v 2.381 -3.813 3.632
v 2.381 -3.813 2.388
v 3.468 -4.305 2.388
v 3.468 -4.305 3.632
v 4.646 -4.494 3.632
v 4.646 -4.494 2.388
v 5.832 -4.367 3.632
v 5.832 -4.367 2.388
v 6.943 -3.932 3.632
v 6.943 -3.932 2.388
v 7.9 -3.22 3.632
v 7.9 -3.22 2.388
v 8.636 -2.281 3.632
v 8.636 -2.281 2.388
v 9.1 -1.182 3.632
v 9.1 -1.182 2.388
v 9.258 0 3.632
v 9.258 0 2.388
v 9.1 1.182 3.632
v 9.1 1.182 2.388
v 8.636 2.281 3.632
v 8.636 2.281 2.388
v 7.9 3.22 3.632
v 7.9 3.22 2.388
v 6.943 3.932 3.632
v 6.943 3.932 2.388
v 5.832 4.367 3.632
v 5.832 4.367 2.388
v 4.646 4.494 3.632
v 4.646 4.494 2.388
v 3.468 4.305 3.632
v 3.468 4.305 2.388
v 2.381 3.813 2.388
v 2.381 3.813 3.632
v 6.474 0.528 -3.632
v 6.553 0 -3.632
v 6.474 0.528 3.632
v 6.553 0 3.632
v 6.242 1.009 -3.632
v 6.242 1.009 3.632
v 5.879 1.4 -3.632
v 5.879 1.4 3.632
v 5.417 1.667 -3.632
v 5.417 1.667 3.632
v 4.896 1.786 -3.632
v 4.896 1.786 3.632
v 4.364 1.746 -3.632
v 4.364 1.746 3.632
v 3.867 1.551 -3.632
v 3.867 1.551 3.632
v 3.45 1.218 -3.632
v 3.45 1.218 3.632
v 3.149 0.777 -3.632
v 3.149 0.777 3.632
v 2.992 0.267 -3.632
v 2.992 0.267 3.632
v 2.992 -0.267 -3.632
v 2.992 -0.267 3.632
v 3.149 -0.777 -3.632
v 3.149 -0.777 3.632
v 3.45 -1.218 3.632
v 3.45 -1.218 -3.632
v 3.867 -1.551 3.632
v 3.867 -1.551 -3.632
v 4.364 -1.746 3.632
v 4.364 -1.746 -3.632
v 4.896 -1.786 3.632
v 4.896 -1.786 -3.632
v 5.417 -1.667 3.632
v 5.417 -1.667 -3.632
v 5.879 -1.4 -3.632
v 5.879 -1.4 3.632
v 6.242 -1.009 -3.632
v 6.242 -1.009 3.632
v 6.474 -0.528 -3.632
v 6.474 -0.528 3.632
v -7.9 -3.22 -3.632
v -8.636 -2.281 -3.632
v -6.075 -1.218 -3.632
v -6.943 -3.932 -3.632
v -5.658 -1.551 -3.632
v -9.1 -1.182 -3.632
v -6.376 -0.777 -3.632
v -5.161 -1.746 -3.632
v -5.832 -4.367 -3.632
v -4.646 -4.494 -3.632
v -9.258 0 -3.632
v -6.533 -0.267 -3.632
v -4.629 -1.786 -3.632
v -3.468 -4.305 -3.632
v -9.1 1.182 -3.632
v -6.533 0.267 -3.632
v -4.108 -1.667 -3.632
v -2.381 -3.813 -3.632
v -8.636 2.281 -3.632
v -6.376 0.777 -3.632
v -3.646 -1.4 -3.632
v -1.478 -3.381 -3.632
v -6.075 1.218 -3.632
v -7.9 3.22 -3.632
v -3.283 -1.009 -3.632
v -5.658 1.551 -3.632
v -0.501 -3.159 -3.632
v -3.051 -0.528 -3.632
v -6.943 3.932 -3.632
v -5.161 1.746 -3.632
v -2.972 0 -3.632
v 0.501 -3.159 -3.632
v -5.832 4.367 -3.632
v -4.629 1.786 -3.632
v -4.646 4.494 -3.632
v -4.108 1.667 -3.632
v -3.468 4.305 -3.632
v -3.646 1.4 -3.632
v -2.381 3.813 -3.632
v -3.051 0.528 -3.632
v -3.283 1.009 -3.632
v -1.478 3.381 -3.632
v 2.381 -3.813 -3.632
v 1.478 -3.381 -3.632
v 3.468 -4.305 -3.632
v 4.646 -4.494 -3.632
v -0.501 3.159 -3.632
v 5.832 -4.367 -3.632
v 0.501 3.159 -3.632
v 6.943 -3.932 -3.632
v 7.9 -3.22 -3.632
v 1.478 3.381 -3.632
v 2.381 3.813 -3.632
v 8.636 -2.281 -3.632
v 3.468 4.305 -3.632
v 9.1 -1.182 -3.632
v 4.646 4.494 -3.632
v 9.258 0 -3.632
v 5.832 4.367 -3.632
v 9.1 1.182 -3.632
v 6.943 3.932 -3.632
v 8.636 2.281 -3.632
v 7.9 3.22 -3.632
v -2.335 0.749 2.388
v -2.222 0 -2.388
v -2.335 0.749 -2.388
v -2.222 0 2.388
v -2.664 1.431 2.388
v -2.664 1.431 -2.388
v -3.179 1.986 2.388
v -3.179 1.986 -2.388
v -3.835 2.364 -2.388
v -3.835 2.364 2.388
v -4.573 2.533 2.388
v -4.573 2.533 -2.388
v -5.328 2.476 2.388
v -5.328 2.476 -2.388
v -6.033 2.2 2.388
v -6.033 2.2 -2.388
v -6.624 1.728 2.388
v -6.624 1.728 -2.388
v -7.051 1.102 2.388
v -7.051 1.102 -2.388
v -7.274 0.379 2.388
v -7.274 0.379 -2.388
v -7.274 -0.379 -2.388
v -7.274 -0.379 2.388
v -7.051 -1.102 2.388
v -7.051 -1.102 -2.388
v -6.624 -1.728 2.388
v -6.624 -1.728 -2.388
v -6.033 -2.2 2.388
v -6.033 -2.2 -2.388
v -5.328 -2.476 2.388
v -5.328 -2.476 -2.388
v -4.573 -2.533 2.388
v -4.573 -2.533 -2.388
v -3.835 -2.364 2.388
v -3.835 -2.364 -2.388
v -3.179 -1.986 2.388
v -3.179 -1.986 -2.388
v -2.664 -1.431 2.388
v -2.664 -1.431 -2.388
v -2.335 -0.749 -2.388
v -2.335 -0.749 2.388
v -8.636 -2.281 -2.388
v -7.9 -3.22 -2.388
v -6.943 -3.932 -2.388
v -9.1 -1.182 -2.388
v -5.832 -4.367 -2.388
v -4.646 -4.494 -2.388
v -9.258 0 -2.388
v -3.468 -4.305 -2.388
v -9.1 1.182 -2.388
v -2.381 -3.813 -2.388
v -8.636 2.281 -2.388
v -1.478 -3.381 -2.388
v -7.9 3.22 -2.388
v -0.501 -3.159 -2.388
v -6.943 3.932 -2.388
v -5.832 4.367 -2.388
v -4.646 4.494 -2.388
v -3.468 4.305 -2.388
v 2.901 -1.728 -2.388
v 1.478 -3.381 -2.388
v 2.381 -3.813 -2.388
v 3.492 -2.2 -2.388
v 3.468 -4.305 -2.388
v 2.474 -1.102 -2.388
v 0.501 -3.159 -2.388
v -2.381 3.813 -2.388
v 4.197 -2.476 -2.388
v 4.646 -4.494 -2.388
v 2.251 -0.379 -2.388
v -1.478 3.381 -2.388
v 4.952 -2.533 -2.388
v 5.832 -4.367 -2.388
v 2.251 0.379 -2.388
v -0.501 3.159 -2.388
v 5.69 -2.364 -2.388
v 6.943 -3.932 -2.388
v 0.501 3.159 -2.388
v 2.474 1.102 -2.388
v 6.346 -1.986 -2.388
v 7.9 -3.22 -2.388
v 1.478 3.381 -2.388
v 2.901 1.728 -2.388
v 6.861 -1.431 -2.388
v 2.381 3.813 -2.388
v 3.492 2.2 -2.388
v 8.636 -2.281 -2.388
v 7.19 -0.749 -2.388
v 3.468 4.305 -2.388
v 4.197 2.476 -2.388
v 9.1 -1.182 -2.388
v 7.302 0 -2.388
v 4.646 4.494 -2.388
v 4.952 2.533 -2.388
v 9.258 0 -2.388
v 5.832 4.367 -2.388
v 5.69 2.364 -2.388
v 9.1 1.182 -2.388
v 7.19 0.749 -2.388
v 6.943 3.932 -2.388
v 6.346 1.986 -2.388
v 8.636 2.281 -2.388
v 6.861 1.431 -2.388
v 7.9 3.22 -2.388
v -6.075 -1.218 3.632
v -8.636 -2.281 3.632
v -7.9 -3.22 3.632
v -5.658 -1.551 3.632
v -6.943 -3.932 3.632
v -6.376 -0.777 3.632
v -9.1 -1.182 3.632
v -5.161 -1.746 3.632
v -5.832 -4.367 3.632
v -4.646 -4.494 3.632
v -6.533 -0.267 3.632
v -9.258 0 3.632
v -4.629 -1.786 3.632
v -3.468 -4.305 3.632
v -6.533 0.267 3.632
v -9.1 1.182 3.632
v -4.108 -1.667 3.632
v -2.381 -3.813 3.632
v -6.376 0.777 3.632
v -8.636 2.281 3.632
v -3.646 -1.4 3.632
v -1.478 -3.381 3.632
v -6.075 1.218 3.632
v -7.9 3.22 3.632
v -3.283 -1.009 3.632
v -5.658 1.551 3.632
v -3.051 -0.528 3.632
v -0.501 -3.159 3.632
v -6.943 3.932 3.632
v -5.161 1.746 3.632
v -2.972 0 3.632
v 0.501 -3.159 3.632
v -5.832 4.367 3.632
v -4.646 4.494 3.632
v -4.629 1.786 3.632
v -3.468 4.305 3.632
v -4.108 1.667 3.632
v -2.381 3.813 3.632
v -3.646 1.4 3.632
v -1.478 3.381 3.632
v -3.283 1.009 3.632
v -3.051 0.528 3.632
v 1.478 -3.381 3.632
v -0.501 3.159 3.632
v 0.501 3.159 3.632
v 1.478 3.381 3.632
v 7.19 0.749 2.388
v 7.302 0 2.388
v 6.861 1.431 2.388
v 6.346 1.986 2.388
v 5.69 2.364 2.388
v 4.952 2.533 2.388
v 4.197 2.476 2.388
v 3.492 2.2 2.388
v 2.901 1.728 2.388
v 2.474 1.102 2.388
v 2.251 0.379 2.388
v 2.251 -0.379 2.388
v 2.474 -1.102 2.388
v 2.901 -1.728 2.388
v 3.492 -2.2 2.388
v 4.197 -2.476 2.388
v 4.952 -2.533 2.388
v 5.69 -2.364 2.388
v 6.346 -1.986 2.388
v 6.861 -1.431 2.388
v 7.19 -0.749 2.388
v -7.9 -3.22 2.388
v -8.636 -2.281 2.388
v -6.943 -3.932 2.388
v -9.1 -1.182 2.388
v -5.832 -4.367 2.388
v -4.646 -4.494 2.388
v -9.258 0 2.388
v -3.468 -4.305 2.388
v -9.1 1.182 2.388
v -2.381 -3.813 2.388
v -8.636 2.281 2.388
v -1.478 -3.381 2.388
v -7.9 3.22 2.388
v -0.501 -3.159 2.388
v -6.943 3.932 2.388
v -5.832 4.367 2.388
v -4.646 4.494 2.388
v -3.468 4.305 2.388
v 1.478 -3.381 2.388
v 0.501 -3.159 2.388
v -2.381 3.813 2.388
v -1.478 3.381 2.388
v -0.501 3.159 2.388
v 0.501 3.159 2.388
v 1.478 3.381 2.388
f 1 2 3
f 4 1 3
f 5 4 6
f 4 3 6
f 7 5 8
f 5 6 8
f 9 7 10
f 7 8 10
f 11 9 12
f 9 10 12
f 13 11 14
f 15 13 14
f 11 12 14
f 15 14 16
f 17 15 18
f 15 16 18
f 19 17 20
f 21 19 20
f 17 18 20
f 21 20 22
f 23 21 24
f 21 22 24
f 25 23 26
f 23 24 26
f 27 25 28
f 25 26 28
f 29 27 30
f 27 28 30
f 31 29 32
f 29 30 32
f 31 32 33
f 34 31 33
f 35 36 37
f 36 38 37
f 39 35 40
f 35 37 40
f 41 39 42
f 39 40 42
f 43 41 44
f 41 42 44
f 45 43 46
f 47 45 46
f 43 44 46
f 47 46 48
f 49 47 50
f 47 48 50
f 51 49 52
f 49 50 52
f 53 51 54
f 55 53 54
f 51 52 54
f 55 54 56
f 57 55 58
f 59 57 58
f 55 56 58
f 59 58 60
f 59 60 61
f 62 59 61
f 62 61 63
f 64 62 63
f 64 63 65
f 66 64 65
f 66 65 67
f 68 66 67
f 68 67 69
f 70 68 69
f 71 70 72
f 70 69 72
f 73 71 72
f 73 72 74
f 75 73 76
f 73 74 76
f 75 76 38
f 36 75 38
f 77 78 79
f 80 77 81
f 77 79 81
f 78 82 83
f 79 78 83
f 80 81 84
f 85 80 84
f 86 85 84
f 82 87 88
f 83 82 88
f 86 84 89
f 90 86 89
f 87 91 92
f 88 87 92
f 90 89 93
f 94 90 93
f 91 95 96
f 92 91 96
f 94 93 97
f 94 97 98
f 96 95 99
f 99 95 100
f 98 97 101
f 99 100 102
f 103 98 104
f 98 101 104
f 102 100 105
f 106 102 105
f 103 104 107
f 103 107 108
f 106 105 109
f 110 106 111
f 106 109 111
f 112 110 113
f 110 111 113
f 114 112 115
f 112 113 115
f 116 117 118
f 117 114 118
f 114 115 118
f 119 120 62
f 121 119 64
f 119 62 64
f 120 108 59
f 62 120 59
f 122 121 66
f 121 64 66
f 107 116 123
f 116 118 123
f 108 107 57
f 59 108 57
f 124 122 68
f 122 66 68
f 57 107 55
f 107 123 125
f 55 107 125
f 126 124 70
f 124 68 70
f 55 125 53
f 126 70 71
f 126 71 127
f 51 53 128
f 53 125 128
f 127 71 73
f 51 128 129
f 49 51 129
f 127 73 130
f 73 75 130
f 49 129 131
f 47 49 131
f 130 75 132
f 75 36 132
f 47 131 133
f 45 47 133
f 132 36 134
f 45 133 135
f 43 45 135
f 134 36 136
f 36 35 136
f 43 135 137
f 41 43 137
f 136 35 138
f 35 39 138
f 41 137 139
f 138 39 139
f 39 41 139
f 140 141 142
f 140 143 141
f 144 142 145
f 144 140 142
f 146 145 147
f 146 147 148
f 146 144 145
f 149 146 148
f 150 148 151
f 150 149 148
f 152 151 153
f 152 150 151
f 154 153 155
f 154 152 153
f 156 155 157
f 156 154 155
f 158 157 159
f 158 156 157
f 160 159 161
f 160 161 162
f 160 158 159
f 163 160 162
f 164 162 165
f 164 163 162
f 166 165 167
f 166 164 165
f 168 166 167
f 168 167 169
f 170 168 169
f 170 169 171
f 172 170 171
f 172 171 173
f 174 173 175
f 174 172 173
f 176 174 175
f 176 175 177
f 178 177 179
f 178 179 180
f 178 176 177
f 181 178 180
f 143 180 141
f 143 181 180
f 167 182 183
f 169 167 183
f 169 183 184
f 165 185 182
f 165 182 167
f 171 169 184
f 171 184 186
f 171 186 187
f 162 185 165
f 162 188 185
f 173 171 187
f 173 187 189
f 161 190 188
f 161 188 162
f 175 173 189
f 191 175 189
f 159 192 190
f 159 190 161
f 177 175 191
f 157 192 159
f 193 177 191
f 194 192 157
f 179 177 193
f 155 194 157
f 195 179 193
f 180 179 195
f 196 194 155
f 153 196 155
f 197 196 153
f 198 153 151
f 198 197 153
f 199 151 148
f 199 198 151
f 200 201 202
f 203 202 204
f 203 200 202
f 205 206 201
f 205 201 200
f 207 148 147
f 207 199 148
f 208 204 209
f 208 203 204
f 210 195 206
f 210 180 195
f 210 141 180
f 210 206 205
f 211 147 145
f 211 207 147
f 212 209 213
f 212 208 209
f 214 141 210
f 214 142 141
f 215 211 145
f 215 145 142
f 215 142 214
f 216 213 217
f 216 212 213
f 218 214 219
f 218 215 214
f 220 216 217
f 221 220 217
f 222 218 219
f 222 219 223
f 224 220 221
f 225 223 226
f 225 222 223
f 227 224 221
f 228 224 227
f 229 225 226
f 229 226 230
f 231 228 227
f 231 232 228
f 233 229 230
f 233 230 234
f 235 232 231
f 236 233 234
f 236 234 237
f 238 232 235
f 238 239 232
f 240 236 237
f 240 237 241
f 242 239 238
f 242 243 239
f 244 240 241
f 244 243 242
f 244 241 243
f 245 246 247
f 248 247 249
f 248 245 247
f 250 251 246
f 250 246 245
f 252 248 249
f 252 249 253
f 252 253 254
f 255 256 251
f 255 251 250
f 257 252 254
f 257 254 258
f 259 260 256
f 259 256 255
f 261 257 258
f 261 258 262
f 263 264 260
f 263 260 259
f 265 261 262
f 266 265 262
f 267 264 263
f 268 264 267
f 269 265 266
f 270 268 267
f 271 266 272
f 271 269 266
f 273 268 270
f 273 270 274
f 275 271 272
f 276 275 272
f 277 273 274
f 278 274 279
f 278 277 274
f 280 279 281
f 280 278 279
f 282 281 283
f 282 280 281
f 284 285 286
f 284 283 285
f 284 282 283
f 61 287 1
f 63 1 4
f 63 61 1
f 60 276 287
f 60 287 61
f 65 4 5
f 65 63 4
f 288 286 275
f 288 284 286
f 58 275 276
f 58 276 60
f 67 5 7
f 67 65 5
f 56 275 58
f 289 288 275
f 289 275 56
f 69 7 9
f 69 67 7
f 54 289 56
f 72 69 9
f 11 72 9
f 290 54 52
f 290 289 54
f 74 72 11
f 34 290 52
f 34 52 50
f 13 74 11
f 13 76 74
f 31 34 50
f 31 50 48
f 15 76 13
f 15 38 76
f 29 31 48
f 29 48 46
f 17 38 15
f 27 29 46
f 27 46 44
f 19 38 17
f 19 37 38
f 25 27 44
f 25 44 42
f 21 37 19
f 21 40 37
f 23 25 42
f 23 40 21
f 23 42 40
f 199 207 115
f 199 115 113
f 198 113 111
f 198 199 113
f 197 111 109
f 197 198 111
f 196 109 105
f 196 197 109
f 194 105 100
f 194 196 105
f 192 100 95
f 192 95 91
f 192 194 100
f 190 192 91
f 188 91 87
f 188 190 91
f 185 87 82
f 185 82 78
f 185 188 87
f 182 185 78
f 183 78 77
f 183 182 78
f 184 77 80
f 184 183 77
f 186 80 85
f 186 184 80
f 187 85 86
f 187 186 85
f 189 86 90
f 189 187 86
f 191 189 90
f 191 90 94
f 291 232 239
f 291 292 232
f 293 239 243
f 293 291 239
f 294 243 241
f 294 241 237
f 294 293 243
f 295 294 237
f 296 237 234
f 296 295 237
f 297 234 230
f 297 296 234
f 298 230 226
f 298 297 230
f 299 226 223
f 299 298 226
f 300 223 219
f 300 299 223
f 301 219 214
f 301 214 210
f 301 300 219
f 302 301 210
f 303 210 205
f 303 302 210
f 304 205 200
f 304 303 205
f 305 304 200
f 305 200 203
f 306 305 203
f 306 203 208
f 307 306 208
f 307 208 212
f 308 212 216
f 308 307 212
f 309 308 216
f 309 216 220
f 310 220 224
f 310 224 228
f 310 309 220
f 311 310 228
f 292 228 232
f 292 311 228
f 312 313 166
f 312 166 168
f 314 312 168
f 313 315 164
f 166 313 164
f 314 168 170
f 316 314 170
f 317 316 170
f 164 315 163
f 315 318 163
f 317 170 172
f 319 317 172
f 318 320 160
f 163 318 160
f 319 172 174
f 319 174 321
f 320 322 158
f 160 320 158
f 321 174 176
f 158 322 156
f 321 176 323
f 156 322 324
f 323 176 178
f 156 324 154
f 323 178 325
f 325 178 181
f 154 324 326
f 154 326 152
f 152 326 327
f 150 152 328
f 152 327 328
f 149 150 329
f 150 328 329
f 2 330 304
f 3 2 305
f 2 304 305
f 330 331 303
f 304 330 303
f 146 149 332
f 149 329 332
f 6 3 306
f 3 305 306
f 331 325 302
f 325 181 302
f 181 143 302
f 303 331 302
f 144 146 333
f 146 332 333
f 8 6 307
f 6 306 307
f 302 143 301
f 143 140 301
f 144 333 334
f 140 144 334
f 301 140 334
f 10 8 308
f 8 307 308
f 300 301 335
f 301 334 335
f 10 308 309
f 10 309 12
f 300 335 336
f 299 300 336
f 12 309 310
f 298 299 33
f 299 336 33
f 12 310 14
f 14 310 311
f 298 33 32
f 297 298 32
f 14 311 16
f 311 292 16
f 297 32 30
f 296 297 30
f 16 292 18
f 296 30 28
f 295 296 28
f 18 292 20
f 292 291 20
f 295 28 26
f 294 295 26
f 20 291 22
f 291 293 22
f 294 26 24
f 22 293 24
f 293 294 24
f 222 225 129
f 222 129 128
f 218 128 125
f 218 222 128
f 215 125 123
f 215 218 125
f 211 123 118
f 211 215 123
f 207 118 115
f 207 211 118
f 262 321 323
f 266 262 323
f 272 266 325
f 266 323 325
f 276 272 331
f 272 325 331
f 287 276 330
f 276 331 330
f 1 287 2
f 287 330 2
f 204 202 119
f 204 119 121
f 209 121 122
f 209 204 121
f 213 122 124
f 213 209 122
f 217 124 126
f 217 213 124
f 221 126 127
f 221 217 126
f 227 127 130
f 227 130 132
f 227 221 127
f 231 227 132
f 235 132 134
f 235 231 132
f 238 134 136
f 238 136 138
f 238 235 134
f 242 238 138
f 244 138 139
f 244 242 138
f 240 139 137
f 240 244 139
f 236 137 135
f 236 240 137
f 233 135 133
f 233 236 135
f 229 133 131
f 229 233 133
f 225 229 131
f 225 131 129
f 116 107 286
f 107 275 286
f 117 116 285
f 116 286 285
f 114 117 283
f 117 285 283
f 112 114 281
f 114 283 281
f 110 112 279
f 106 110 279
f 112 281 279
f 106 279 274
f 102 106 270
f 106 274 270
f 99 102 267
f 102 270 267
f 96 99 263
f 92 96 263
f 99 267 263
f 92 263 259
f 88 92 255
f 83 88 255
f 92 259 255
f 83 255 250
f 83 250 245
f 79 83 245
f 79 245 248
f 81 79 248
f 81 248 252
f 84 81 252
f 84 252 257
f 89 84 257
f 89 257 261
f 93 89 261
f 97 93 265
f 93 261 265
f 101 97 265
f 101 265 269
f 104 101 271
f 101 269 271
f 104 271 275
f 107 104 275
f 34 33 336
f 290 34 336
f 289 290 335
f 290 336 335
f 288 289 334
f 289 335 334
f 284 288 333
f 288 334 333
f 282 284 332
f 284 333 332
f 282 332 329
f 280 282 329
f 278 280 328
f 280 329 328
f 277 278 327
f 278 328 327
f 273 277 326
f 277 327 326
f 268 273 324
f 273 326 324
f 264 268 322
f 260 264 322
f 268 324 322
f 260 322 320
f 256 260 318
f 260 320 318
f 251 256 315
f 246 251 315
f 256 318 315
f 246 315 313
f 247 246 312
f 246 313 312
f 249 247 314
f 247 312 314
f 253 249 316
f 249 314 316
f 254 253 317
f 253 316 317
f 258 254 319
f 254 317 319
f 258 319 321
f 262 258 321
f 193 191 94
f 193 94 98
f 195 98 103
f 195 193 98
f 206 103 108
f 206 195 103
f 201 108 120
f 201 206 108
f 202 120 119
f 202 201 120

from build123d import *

# Parameters (mm, degrees)
SKETCH1_R             = 2.54
SKETCH1_R_2           = 1.7907
BOSS_EXTRUDE1_DEPTH   = 2.3876
BOSS_EXTRUDE1_2_DEPTH = 2.3876
SKETCH3_R             = 1.7907
BOSS_EXTRUDE2_DEPTH   = 1.2446


with BuildPart() as part:
    # Sketch1 → Boss-Extrude1 (new body, symmetric)
    with BuildSketch(Plane.XY):
        with Locations((-4.7625, 0)):
            Circle(SKETCH1_R)
        with Locations((-4.7625, 0)):
            Circle(SKETCH1_R_2, mode=Mode.SUBTRACT)
    extrude(amount=BOSS_EXTRUDE1_DEPTH, both=True)



with BuildPart() as body_2:
    # Sketch1 → Boss-Extrude1 2 (new body, symmetric)
    with BuildSketch(Plane.XY):
        with Locations((4.7625, 0)):
            Circle(SKETCH1_R)
        with Locations((4.7625, 0)):
            Circle(SKETCH1_R_2, mode=Mode.SUBTRACT)
    extrude(amount=BOSS_EXTRUDE1_2_DEPTH, both=True)


with BuildPart() as part_1:
    add(part.part)

    add(body_2.part)  # Boss-Extrude2 merges body 2
    # Sketch3 → Boss-Extrude2 (add)
    with BuildSketch(Plane.XY.offset(2.3876)):
        with BuildLine():
            ThreePointArc((-2.38125, 3.813379876), (-9.2583, 0), (-2.38125, -3.813379876))
            ThreePointArc((-2.38125, -3.813379876), (0, -3.130959752), (2.38125, -3.813379876))
            ThreePointArc((2.38125, -3.813379876), (9.2583, 0), (2.38125, 3.813379876))
            ThreePointArc((2.38125, 3.813379876), (0, 3.130959752), (-2.38125, 3.813379876))
        make_face()
        with Locations((-4.7625, 0)):
            Circle(SKETCH3_R, mode=Mode.SUBTRACT)
        with Locations((4.7625, 0)):
            Circle(SKETCH3_R, mode=Mode.SUBTRACT)
    boss_extrude2 = extrude(amount=BOSS_EXTRUDE2_DEPTH)

    # Mirror3: Boss-Extrude2 across plane
    add(boss_extrude2.mirror(Plane.XY))


solid = part_1.part
